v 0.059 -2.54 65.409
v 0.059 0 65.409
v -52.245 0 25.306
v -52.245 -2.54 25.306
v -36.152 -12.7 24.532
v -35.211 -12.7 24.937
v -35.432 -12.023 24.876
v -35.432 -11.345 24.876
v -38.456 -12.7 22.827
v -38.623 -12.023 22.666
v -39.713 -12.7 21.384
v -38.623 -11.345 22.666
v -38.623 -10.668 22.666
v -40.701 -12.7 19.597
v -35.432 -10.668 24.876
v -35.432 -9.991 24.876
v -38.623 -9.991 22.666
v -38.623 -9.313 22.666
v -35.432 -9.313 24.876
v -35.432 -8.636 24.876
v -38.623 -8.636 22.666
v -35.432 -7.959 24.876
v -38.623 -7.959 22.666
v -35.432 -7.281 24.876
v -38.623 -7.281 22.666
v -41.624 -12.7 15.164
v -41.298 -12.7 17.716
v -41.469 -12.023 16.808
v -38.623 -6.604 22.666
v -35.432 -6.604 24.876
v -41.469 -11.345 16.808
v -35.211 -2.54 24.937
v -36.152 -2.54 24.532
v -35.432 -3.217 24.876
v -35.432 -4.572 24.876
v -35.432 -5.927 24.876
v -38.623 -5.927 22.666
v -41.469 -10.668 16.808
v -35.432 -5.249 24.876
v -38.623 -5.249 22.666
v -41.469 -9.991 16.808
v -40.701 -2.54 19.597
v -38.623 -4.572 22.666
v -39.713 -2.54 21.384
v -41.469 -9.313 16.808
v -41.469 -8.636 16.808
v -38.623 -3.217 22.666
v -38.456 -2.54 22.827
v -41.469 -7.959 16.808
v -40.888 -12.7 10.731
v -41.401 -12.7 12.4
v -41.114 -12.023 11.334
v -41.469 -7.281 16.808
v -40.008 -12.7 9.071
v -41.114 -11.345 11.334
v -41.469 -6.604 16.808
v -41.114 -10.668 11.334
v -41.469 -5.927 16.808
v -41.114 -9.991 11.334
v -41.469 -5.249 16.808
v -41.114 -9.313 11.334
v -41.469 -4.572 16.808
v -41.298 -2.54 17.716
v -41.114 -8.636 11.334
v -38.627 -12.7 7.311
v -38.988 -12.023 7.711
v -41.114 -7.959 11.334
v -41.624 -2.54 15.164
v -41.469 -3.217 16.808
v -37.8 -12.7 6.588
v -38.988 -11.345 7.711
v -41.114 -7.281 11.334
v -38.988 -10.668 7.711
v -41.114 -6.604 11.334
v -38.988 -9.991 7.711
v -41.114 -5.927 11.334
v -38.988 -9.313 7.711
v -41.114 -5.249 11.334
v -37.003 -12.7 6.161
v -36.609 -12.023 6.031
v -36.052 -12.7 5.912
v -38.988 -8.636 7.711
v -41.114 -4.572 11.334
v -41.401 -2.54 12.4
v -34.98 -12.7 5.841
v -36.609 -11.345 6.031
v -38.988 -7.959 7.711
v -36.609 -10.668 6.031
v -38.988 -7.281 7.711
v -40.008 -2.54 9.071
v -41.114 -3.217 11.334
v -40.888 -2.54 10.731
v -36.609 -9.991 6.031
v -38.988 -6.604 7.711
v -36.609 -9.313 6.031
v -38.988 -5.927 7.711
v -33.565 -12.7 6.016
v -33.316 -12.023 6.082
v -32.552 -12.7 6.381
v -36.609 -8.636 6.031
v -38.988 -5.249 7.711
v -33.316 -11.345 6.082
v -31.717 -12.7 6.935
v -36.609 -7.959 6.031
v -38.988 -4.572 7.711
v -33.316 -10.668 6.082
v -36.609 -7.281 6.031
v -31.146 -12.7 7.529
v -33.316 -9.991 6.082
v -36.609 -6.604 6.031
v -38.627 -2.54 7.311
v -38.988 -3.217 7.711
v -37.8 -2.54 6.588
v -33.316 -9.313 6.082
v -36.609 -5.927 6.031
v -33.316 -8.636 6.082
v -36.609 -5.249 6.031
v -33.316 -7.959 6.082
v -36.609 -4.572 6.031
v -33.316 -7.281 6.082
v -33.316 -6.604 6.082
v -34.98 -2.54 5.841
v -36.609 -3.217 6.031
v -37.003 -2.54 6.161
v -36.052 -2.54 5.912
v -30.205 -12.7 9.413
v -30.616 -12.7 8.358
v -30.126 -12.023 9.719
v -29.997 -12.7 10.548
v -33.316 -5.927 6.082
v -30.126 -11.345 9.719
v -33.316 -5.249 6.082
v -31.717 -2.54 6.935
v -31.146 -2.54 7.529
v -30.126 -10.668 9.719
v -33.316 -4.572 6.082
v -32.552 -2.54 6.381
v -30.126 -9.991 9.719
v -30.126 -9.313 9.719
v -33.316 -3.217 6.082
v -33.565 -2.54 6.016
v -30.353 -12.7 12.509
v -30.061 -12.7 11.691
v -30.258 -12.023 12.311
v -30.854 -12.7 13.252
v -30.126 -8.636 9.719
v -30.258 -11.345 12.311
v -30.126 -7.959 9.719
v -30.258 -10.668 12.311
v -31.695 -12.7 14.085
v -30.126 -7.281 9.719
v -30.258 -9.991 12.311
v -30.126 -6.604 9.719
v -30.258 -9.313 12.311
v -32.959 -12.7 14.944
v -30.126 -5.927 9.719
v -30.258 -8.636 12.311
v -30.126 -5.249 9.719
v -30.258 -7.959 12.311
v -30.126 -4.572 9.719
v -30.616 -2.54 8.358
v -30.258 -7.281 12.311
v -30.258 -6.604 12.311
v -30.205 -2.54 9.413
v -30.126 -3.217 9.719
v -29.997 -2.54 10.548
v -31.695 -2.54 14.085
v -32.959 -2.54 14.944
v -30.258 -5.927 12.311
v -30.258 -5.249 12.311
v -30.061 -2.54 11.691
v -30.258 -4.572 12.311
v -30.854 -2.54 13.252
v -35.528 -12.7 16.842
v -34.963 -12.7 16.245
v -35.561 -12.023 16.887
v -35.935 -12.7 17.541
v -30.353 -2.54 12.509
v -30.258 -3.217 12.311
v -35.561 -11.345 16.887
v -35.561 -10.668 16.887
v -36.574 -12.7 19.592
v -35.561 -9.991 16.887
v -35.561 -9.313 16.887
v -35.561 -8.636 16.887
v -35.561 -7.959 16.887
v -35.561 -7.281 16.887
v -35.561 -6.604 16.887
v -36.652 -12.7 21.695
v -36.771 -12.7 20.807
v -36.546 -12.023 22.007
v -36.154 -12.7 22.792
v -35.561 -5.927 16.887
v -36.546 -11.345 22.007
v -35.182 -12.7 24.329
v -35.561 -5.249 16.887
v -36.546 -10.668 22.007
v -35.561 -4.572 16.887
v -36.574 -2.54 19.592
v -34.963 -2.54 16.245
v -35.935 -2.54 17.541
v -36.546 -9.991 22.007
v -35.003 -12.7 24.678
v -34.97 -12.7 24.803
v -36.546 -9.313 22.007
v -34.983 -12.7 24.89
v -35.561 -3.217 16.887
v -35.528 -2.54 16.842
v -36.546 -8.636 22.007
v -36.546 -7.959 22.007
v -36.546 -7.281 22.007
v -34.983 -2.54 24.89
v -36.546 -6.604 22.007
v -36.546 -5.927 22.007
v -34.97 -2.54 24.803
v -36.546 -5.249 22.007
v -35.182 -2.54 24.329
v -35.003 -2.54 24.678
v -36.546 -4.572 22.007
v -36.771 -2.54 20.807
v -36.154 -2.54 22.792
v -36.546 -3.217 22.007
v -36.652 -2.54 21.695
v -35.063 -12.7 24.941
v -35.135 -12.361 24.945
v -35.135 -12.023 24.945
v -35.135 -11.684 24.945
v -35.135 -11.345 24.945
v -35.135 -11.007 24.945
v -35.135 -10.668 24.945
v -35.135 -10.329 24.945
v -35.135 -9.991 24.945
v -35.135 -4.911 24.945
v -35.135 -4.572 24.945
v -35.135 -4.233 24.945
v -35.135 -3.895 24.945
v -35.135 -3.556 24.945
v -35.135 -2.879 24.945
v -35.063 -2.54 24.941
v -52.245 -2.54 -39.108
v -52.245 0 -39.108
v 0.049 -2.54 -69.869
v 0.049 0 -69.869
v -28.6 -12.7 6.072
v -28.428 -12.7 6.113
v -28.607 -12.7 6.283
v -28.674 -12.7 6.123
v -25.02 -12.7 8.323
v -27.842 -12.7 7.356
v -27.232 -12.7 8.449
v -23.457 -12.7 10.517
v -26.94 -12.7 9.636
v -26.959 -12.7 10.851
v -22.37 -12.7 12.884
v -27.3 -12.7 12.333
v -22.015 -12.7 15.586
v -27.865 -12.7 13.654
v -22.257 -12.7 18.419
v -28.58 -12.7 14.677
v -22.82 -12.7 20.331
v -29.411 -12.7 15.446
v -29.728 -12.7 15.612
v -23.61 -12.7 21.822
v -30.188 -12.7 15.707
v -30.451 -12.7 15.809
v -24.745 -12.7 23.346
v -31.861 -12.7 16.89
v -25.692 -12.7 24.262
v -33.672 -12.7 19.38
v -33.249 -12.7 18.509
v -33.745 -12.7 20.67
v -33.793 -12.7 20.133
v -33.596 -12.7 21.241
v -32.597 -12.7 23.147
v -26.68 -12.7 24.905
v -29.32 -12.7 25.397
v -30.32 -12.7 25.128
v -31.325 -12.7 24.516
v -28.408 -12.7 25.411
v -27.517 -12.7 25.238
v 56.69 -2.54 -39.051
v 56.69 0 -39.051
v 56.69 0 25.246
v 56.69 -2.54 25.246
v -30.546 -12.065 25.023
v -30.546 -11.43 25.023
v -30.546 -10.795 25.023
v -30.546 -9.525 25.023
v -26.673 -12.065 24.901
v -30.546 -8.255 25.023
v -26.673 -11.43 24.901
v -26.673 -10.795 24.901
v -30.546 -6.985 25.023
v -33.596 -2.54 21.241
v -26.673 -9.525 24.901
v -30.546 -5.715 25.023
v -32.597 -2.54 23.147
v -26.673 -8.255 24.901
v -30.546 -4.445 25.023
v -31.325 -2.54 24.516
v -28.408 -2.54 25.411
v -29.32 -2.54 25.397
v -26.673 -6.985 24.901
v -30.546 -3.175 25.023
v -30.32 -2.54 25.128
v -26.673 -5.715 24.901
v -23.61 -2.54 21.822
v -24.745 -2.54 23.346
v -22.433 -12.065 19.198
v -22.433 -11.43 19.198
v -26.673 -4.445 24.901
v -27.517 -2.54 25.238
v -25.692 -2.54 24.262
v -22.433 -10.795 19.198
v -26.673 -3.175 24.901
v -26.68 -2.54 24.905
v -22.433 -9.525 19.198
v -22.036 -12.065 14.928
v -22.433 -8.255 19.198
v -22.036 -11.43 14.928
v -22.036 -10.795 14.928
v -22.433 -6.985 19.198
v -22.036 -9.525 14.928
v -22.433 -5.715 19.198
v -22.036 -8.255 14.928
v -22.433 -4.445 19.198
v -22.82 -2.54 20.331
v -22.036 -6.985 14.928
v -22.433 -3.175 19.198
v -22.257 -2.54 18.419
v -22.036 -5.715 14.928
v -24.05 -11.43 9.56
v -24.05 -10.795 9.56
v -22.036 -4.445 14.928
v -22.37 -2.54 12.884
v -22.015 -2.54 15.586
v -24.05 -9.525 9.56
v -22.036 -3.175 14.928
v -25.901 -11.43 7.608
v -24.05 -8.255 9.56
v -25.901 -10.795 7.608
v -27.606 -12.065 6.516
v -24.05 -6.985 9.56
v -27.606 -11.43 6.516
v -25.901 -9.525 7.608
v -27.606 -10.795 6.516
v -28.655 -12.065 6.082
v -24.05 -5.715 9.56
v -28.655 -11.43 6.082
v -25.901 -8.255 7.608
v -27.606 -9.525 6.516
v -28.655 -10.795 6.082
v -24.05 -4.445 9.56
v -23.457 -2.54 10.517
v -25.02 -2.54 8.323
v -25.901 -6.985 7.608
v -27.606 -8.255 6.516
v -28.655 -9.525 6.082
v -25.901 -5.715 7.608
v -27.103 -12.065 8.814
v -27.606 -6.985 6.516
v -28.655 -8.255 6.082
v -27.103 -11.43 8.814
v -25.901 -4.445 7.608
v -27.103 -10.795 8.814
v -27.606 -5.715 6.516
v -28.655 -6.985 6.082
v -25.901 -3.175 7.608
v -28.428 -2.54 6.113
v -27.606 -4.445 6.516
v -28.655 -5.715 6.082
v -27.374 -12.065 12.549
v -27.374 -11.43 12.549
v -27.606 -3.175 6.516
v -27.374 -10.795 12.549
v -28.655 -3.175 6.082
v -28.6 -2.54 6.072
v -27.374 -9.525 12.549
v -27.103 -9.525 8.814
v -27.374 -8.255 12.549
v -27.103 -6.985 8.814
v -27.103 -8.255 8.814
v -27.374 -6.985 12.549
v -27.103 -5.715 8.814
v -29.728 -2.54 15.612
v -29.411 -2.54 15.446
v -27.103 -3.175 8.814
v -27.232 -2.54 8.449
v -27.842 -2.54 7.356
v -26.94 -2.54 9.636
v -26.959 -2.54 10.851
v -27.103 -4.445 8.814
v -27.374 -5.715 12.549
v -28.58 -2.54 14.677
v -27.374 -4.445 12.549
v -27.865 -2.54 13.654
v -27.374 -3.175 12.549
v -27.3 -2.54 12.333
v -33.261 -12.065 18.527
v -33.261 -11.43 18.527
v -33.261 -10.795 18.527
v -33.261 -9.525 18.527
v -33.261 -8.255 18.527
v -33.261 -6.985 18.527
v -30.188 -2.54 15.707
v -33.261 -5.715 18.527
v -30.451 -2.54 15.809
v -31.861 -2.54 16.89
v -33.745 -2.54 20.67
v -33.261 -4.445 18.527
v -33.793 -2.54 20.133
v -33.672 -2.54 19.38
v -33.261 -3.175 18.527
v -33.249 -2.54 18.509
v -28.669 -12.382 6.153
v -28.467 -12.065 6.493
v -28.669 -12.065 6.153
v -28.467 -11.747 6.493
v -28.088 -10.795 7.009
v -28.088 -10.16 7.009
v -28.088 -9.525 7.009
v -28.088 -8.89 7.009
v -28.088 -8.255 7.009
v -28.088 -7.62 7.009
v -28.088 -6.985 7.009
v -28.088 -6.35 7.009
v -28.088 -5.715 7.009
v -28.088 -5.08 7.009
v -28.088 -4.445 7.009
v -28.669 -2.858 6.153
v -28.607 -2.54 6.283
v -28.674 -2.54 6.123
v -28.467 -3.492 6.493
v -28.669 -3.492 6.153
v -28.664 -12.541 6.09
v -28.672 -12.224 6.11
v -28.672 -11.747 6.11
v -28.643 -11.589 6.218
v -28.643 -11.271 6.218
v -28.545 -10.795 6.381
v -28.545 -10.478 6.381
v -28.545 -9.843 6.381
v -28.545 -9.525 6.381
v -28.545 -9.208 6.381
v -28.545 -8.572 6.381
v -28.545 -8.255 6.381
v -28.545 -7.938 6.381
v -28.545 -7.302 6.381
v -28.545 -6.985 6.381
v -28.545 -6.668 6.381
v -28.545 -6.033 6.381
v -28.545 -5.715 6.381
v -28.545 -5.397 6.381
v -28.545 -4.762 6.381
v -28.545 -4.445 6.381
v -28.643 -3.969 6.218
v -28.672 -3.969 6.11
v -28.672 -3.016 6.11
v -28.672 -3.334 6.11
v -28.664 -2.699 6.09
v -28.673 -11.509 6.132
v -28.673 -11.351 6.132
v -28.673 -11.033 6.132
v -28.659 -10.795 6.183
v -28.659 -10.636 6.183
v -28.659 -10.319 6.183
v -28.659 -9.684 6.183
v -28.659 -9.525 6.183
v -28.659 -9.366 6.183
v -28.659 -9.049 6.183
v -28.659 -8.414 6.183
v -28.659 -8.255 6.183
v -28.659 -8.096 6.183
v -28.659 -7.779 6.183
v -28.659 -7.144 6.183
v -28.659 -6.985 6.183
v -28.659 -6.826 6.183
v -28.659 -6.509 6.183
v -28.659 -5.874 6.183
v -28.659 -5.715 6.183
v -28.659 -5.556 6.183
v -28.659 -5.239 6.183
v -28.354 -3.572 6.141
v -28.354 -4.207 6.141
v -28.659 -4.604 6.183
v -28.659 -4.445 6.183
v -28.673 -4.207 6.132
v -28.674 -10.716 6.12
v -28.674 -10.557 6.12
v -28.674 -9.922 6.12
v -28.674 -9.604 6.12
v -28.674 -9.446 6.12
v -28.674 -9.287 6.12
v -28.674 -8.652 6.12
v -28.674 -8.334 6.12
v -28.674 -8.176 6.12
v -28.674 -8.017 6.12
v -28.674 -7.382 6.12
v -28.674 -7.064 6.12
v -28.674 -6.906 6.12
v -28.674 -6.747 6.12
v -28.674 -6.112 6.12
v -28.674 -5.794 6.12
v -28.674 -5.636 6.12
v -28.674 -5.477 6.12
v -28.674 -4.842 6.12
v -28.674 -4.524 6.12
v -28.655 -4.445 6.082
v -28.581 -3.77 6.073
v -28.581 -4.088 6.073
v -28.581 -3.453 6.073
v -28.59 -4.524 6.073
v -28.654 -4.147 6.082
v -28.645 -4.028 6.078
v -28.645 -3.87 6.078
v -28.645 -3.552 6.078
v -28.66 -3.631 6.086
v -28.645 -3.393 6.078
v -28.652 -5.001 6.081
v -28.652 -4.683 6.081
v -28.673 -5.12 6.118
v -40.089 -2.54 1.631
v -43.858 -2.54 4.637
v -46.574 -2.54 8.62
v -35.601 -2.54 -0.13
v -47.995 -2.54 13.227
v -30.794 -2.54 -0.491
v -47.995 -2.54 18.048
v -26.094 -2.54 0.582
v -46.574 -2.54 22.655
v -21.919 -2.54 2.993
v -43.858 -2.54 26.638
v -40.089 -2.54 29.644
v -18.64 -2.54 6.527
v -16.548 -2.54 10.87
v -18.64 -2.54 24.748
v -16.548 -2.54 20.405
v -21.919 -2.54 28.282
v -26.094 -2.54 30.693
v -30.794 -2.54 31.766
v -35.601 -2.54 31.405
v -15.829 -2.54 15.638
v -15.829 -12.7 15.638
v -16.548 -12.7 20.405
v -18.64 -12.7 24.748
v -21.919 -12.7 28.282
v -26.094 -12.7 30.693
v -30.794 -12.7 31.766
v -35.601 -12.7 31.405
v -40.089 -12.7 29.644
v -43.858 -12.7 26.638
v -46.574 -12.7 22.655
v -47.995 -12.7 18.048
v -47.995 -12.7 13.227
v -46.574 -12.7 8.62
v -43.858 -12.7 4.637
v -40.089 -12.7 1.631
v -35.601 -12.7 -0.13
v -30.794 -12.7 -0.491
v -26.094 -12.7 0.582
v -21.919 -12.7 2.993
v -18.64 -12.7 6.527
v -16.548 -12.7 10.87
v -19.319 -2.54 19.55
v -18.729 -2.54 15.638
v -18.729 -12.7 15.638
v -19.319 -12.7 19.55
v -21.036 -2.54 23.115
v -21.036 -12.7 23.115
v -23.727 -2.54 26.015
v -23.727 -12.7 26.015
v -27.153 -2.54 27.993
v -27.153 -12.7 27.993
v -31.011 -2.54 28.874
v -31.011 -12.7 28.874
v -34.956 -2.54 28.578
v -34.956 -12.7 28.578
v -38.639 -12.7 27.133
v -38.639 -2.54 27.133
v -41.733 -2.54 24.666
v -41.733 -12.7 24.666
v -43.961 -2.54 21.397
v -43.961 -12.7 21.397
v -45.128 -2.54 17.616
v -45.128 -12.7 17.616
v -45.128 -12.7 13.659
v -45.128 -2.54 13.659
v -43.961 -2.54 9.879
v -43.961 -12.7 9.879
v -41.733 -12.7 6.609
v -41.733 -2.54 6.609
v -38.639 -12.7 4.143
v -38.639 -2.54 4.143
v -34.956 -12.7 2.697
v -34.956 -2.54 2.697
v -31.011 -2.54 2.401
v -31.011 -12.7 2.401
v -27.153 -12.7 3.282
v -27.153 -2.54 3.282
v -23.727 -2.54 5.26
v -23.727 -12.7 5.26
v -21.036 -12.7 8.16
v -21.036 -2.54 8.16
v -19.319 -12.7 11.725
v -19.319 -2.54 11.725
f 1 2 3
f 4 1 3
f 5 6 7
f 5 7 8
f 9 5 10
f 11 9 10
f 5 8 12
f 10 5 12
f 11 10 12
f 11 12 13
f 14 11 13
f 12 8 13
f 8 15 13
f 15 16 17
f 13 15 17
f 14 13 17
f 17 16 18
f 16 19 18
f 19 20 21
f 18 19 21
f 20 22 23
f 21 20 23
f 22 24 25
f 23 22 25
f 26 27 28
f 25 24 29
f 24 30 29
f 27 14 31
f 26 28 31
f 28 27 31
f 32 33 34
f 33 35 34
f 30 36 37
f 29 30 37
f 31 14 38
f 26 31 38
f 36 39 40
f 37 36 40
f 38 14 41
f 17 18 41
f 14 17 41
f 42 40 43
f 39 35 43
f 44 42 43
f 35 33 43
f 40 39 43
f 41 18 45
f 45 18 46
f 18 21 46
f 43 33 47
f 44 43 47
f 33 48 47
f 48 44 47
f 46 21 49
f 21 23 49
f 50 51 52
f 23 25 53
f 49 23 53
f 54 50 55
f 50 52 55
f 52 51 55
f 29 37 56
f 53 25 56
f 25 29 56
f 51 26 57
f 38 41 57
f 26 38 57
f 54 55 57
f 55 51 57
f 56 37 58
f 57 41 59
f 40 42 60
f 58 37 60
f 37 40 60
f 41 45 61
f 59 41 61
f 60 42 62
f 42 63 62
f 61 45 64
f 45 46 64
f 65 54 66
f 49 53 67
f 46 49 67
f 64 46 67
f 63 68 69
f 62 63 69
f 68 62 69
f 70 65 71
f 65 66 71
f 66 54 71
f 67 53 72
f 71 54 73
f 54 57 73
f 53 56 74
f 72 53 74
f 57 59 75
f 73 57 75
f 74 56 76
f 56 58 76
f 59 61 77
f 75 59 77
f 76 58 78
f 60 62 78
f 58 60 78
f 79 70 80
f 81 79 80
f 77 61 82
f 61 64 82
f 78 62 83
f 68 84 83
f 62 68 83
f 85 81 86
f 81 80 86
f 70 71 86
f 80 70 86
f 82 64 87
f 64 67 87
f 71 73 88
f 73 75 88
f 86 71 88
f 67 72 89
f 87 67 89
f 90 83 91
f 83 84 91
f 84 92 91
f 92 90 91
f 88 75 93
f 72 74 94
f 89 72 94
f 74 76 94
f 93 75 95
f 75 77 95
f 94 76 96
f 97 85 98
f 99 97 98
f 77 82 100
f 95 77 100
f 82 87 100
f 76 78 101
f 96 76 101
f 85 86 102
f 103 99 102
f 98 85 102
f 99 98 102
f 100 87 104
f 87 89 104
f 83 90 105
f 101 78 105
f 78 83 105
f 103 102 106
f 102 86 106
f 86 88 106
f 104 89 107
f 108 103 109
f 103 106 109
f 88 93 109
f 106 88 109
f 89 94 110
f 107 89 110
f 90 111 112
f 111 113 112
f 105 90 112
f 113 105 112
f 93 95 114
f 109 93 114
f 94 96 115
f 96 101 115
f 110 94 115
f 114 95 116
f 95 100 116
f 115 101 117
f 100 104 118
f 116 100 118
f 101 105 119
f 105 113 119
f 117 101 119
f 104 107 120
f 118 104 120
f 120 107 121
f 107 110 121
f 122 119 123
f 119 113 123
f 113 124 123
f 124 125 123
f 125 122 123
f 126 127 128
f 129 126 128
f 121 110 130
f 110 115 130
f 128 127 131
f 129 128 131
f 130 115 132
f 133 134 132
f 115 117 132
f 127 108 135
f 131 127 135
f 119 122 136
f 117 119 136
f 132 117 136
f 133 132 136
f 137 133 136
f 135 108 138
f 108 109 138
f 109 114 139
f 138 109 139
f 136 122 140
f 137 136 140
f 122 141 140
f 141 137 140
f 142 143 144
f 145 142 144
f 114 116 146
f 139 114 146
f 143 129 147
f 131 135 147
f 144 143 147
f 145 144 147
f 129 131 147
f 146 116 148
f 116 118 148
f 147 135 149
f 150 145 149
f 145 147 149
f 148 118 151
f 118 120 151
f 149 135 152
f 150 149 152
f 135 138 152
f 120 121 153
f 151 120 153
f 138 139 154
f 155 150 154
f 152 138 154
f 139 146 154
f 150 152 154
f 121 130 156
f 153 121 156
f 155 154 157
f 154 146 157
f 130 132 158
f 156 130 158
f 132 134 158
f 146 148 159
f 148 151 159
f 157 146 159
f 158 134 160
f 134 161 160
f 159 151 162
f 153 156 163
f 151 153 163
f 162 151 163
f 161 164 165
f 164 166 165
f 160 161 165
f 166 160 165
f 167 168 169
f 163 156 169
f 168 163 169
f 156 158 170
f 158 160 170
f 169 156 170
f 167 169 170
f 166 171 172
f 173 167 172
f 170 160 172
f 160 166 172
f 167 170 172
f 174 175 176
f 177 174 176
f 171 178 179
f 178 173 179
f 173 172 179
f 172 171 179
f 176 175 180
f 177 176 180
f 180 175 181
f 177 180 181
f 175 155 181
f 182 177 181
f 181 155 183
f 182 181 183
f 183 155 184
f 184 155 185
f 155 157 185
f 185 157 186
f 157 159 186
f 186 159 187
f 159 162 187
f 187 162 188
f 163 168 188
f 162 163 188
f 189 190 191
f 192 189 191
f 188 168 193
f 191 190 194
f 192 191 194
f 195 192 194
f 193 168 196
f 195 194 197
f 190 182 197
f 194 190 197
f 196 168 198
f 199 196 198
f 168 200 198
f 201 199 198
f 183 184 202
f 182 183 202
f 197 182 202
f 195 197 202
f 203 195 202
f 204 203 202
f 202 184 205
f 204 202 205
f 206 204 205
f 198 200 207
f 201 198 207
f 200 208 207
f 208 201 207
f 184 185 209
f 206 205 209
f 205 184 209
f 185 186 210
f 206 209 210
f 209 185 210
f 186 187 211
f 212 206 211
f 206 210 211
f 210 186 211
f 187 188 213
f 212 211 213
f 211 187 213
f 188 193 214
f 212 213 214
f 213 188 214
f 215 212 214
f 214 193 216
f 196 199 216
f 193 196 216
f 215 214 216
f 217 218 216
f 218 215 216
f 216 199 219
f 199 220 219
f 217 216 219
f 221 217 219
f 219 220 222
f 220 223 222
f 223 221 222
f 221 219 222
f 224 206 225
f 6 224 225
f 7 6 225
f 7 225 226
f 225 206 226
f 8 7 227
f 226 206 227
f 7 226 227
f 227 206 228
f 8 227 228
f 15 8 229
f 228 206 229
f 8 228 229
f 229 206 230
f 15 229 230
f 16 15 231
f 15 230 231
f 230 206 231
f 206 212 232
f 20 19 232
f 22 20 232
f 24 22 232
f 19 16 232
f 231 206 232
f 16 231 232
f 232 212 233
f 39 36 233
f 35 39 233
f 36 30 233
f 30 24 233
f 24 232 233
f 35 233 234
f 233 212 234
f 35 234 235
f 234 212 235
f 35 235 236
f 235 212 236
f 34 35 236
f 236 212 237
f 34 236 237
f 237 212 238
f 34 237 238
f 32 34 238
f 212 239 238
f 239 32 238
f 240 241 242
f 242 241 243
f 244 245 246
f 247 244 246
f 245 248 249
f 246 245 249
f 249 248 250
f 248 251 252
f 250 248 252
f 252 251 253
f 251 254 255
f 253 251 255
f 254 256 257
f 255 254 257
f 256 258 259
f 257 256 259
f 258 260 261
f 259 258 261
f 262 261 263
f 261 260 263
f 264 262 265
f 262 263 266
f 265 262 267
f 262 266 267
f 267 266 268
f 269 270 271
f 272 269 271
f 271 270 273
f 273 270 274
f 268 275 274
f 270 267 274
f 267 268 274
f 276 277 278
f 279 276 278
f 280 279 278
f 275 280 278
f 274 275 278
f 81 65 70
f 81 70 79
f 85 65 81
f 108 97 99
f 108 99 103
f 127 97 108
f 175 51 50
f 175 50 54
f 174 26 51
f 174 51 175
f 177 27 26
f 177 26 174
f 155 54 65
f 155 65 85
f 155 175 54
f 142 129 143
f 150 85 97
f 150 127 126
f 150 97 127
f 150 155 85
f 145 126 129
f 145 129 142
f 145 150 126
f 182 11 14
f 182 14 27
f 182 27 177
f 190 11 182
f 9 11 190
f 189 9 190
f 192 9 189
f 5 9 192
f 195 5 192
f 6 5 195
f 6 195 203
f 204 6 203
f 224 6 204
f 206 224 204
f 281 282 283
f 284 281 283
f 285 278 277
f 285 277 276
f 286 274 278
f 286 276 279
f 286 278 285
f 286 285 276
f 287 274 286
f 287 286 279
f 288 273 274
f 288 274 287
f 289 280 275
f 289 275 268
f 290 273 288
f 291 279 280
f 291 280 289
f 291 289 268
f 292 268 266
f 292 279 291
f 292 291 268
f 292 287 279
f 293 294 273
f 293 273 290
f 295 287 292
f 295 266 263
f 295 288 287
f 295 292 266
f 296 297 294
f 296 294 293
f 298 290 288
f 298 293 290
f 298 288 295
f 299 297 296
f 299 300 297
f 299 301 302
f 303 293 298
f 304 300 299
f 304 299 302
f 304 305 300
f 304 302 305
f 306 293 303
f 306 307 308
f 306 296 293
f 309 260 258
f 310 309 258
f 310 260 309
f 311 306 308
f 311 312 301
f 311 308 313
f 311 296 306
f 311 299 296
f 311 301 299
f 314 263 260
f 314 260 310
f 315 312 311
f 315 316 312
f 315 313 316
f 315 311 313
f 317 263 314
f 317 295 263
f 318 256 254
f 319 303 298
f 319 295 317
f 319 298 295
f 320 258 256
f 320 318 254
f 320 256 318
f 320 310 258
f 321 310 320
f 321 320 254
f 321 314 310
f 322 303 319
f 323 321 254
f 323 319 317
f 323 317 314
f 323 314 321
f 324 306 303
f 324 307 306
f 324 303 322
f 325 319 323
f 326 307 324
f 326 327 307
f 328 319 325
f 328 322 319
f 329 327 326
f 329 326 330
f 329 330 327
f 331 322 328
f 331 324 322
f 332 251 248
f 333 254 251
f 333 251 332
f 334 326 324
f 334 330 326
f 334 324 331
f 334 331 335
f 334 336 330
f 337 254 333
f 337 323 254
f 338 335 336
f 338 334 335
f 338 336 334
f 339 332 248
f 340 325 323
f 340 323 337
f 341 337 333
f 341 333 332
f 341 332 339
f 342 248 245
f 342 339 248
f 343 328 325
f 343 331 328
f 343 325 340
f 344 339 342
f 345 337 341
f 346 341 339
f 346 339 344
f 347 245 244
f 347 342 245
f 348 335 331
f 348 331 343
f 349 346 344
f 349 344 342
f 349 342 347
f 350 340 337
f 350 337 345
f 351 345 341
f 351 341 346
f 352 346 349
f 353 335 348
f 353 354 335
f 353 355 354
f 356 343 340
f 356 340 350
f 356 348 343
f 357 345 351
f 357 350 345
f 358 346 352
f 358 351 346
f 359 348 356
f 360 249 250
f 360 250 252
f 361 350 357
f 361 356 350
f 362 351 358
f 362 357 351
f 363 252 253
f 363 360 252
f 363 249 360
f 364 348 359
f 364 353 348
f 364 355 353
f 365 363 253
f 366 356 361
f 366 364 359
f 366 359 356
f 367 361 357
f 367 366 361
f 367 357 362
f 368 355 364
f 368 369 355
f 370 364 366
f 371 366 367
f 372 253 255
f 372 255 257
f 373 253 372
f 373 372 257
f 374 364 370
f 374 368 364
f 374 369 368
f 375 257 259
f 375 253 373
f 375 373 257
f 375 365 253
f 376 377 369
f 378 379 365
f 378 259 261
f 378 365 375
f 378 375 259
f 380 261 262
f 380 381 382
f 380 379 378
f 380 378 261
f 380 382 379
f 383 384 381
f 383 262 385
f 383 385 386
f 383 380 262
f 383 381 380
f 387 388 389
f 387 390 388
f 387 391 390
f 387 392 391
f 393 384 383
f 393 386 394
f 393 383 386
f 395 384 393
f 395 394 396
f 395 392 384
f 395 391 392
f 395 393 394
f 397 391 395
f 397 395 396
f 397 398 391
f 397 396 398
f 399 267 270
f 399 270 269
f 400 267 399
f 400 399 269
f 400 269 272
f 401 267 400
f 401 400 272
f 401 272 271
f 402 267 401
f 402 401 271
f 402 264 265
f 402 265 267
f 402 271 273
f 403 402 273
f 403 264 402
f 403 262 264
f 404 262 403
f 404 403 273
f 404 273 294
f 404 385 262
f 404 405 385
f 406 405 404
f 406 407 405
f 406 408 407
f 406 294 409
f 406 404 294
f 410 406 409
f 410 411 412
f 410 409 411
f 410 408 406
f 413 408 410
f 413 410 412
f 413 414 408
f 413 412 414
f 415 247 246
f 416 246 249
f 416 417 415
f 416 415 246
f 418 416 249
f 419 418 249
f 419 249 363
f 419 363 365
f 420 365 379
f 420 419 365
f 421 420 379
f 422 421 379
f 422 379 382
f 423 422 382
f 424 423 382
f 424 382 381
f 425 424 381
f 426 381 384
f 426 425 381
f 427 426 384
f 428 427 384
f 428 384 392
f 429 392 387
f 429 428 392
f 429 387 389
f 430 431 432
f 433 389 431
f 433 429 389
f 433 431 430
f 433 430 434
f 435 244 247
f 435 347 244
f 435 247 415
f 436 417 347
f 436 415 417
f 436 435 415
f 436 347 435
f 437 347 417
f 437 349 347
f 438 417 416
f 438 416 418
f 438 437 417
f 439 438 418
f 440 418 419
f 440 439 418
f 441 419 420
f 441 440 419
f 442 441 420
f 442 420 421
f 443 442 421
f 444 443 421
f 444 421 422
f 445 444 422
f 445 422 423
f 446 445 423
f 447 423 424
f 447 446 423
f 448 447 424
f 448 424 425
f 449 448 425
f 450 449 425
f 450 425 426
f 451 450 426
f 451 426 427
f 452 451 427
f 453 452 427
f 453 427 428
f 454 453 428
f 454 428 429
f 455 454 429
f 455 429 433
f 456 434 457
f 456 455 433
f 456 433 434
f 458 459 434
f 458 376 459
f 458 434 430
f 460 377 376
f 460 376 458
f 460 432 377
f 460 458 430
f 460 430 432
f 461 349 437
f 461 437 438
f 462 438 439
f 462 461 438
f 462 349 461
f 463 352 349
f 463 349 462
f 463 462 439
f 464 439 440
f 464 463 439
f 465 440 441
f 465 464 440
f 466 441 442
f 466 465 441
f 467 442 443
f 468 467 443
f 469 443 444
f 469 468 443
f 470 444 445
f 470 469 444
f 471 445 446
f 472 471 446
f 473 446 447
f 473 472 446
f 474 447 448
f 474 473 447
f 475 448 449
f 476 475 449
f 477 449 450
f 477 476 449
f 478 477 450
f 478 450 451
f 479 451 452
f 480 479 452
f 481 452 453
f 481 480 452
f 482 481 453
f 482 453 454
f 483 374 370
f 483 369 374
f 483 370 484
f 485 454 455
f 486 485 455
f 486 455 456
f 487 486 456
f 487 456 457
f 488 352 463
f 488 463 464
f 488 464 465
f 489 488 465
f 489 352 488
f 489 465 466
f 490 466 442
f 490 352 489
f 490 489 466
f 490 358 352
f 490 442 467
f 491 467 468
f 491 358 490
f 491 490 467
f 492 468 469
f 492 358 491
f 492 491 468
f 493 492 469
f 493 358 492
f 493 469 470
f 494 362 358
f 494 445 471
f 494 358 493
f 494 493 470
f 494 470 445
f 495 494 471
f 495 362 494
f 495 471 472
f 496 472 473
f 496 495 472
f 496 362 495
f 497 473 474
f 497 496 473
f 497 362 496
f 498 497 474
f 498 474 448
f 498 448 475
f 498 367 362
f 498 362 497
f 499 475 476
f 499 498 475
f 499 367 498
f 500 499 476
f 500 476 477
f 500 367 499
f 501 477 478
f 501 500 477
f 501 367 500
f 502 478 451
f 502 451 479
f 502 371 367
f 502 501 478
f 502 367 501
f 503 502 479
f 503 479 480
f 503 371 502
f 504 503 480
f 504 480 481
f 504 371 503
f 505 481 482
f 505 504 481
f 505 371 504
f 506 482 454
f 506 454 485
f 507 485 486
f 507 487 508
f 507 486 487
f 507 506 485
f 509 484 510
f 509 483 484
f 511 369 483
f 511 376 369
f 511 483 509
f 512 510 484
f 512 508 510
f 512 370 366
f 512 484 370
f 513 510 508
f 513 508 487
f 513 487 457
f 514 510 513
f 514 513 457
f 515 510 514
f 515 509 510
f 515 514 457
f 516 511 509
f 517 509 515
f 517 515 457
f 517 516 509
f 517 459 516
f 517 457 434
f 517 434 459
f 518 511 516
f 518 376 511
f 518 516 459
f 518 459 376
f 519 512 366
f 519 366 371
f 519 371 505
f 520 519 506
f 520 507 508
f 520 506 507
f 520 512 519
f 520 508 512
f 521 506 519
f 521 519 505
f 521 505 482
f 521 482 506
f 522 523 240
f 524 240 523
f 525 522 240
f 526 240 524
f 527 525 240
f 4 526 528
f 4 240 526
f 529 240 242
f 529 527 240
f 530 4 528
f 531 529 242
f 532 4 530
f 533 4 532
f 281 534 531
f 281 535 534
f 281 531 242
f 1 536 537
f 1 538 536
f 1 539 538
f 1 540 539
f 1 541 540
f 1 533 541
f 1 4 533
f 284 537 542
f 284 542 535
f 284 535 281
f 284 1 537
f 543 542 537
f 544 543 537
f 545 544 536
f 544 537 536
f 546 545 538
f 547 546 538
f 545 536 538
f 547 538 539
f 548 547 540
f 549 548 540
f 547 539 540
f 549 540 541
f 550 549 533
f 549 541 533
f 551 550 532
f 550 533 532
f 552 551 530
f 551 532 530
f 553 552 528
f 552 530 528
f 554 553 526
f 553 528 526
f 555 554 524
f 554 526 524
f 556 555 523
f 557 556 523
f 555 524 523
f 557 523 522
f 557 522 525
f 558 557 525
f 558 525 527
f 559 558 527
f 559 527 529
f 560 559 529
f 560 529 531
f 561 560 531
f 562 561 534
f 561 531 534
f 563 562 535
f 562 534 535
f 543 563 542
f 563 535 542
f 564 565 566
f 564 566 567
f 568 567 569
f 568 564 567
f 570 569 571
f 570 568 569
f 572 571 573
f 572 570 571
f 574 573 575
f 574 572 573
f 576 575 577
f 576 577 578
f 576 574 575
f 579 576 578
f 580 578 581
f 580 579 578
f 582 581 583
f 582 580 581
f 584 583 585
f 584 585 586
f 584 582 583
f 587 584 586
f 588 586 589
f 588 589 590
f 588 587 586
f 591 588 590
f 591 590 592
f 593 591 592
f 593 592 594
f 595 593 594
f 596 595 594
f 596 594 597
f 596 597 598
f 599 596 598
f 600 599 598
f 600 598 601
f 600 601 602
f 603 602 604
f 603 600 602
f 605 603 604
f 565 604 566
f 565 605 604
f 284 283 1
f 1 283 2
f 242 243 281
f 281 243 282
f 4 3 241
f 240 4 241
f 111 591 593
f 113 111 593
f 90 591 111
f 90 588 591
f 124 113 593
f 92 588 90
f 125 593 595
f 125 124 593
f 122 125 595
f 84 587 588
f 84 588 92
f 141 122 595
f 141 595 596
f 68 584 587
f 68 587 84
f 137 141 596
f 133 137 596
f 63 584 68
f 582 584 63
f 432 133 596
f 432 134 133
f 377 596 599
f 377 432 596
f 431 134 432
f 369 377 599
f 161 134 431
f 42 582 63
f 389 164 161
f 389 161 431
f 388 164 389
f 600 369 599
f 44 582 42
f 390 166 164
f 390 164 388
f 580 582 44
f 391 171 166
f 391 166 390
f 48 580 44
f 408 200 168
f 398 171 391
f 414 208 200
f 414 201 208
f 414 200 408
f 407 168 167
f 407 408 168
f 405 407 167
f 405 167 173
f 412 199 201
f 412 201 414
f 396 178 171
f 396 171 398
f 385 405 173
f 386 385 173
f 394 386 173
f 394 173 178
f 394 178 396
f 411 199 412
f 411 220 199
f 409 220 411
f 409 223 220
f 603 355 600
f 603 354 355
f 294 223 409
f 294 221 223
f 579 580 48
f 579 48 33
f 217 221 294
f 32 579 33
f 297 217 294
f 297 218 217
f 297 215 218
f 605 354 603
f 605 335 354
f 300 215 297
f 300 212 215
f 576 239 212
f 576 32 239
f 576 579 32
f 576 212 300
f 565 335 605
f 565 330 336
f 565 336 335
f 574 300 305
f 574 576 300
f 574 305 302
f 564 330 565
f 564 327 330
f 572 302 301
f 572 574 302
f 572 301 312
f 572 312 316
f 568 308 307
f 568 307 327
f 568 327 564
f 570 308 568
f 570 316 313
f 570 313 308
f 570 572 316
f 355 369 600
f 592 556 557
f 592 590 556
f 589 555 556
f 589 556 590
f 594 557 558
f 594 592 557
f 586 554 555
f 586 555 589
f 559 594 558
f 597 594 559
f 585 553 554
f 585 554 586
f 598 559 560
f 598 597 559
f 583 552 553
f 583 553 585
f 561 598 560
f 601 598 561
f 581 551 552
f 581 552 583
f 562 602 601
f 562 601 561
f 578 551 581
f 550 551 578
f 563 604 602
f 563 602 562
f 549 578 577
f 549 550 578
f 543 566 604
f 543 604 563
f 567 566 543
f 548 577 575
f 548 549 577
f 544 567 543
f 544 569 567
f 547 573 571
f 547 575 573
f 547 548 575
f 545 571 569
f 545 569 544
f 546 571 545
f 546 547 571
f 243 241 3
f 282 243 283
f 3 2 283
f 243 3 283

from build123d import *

# Parameters (mm, degrees)
F1_DEPTH  = 12.7
F2_DEPTH  = 2.54
F3_DEPTH  = 7.62
F4_DEPTH  = 2.54
F5_DEPTH  = 2.54
F6_DEPTH  = 2.54
F7_DEPTH  = 2.54
F8_DEPTH  = 2.54
F9_DEPTH  = 2.54
F10_R     = 16.173301128
F10_R_2   = 13.2732691709
F11_DEPTH = 10.16


with BuildPart() as f1:
    # F0 (on Front) → F1 (new body)
    with BuildSketch(Plane.XZ):
        Polygon((59.2296272516, 26.558874175), (0, 68.5641244054), (-54.7846257687, 26.558874175), (-54.7846257687, -40.5606217682), (0, -72.7868750691), (59.2296272516, -40.5606217682), align=None)
    extrude(amount=F1_DEPTH)

    # F2 (cut): a face of the model
    f2_faces = [f1.faces().sort_by_distance(p)[0] for p in [
        (1.9587071028, -12.7, -4.2659517496),
    ]]
    extrude(f2_faces, amount=-F2_DEPTH, mode=Mode.SUBTRACT)

    # F3 (cut): a face of the model
    f3_faces = [f1.faces().sort_by_distance(p)[0] for p in [
        (1.9587071028, -10.16, -4.2659517496),
    ]]
    extrude(f3_faces, amount=-F3_DEPTH, mode=Mode.SUBTRACT)

    # F4 (cut): a face of the model
    f4_faces = [f1.faces().sort_by_distance(p)[0] for p in [
        (29.6148136258, -1.27, 47.5614992902),
    ]]
    extrude(f4_faces, amount=-F4_DEPTH, mode=Mode.SUBTRACT)

    # F5 (cut): a face of the model
    f5_faces = [f1.faces().sort_by_distance(p)[0] for p in [
        (-27.3923128843, -1.27, 47.5614992902),
    ]]
    extrude(f5_faces, amount=-F5_DEPTH, mode=Mode.SUBTRACT)

    # F6 (cut): a face of the model
    f6_faces = [f1.faces().sort_by_distance(p)[0] for p in [
        (59.2296272516, -1.27, -7.0008737966),
    ]]
    extrude(f6_faces, amount=-F6_DEPTH, mode=Mode.SUBTRACT)

    # F7 (cut): a face of the model
    f7_faces = [f1.faces().sort_by_distance(p)[0] for p in [
        (-54.7846257687, -1.27, -7.0008737966),
    ]]
    extrude(f7_faces, amount=-F7_DEPTH, mode=Mode.SUBTRACT)

    # F8 (cut): a face of the model
    f8_faces = [f1.faces().sort_by_distance(p)[0] for p in [
        (-27.3923128843, -1.27, -56.6737484187),
    ]]
    extrude(f8_faces, amount=-F8_DEPTH, mode=Mode.SUBTRACT)

    # F9 (cut): a face of the model
    f9_faces = [f1.faces().sort_by_distance(p)[0] for p in [
        (29.6148136258, -1.27, -56.6737484187),
    ]]
    extrude(f9_faces, amount=-F9_DEPTH, mode=Mode.SUBTRACT)

    # F10 (on face) → F11 (join)
    with BuildSketch(Plane.XZ.offset(2.54)):
        with Locations((-32.0025384426, 15.63757658)):
            Circle(F10_R)
        with Locations((-32.0025384426, 15.63757658)):
            Circle(F10_R_2, mode=Mode.SUBTRACT)
        with BuildLine():
            add(Edge.make_bspline(
                [(-33.5961766541, 21.2412513793), (-33.1492776835, 22.5807073107), (-30.9008253001, 25.8515795844), (-26.4172585119, 25.3257909083), (-23.8187268917, 22.3823531071), (-22.1773049658, 19.3222183747), (-21.8666938493, 14.9030170423), (-22.4811159871, 12.0656202443), (-24.1113840842, 9.4382361214), (-25.1206009779, 7.9357990415), (-30.073349283, 4.9901899104), (-26.3944730083, 8.5551386268), (-27.1981324947, 12.5803540617), (-28.3513584816, 14.5701110117), (-29.6739604056, 15.7483599916), (-30.4871570995, 15.543927958), (-33.751302235, 18.5025468364), (-33.9314850499, 20.2362572996), (-33.5961766541, 21.2412513793)],
                knots=[0, 0, 0, 0, 0.0792911137, 0.1501065964, 0.2196050044, 0.2868269554, 0.361319848, 0.4232868285, 0.4837605091, 0.5381934016, 0.6059924585, 0.665205235, 0.7384846564, 0.7939319213, 0.8382116548, 0.8688404987, 0.94050786, 1, 1, 1, 1], degree=3))
        make_face()
        with BuildLine():
            add(Edge.make_bspline(
                [(-34.9833630025, 24.8904135078), (-35.168575554, 25.2164447888), (-39.7345110582, 22.6204650031), (-41.8664556921, 16.9916859993), (-41.5832281583, 11.3039533818), (-39.1242273338, 7.6554368419), (-36.9766990698, 5.735143943), (-33.2081987088, 5.7841669021), (-31.0308089727, 7.3164844395), (-29.9591991622, 9.6760169365), (-29.8732056251, 12.4014101557), (-31.9683798521, 14.4478650596), (-33.6520606287, 15.2926663792), (-35.8456473217, 16.7286638318), (-36.4557260431, 19.2623287104), (-37.2581020202, 21.8517411964), (-34.820944947, 24.6045075783), (-34.9833630025, 24.8904135078)],
                knots=[0, 0, 0, 0, 0.0765925653, 0.1712433684, 0.2581090796, 0.3341281069, 0.3955345086, 0.4645788585, 0.523706665, 0.582159146, 0.641530163, 0.7024599948, 0.7543504268, 0.8122325682, 0.8706612342, 0.9328338419, 1, 1, 1, 1], degree=3))
        make_face()
    extrude(amount=F11_DEPTH)


solid = f1.part
